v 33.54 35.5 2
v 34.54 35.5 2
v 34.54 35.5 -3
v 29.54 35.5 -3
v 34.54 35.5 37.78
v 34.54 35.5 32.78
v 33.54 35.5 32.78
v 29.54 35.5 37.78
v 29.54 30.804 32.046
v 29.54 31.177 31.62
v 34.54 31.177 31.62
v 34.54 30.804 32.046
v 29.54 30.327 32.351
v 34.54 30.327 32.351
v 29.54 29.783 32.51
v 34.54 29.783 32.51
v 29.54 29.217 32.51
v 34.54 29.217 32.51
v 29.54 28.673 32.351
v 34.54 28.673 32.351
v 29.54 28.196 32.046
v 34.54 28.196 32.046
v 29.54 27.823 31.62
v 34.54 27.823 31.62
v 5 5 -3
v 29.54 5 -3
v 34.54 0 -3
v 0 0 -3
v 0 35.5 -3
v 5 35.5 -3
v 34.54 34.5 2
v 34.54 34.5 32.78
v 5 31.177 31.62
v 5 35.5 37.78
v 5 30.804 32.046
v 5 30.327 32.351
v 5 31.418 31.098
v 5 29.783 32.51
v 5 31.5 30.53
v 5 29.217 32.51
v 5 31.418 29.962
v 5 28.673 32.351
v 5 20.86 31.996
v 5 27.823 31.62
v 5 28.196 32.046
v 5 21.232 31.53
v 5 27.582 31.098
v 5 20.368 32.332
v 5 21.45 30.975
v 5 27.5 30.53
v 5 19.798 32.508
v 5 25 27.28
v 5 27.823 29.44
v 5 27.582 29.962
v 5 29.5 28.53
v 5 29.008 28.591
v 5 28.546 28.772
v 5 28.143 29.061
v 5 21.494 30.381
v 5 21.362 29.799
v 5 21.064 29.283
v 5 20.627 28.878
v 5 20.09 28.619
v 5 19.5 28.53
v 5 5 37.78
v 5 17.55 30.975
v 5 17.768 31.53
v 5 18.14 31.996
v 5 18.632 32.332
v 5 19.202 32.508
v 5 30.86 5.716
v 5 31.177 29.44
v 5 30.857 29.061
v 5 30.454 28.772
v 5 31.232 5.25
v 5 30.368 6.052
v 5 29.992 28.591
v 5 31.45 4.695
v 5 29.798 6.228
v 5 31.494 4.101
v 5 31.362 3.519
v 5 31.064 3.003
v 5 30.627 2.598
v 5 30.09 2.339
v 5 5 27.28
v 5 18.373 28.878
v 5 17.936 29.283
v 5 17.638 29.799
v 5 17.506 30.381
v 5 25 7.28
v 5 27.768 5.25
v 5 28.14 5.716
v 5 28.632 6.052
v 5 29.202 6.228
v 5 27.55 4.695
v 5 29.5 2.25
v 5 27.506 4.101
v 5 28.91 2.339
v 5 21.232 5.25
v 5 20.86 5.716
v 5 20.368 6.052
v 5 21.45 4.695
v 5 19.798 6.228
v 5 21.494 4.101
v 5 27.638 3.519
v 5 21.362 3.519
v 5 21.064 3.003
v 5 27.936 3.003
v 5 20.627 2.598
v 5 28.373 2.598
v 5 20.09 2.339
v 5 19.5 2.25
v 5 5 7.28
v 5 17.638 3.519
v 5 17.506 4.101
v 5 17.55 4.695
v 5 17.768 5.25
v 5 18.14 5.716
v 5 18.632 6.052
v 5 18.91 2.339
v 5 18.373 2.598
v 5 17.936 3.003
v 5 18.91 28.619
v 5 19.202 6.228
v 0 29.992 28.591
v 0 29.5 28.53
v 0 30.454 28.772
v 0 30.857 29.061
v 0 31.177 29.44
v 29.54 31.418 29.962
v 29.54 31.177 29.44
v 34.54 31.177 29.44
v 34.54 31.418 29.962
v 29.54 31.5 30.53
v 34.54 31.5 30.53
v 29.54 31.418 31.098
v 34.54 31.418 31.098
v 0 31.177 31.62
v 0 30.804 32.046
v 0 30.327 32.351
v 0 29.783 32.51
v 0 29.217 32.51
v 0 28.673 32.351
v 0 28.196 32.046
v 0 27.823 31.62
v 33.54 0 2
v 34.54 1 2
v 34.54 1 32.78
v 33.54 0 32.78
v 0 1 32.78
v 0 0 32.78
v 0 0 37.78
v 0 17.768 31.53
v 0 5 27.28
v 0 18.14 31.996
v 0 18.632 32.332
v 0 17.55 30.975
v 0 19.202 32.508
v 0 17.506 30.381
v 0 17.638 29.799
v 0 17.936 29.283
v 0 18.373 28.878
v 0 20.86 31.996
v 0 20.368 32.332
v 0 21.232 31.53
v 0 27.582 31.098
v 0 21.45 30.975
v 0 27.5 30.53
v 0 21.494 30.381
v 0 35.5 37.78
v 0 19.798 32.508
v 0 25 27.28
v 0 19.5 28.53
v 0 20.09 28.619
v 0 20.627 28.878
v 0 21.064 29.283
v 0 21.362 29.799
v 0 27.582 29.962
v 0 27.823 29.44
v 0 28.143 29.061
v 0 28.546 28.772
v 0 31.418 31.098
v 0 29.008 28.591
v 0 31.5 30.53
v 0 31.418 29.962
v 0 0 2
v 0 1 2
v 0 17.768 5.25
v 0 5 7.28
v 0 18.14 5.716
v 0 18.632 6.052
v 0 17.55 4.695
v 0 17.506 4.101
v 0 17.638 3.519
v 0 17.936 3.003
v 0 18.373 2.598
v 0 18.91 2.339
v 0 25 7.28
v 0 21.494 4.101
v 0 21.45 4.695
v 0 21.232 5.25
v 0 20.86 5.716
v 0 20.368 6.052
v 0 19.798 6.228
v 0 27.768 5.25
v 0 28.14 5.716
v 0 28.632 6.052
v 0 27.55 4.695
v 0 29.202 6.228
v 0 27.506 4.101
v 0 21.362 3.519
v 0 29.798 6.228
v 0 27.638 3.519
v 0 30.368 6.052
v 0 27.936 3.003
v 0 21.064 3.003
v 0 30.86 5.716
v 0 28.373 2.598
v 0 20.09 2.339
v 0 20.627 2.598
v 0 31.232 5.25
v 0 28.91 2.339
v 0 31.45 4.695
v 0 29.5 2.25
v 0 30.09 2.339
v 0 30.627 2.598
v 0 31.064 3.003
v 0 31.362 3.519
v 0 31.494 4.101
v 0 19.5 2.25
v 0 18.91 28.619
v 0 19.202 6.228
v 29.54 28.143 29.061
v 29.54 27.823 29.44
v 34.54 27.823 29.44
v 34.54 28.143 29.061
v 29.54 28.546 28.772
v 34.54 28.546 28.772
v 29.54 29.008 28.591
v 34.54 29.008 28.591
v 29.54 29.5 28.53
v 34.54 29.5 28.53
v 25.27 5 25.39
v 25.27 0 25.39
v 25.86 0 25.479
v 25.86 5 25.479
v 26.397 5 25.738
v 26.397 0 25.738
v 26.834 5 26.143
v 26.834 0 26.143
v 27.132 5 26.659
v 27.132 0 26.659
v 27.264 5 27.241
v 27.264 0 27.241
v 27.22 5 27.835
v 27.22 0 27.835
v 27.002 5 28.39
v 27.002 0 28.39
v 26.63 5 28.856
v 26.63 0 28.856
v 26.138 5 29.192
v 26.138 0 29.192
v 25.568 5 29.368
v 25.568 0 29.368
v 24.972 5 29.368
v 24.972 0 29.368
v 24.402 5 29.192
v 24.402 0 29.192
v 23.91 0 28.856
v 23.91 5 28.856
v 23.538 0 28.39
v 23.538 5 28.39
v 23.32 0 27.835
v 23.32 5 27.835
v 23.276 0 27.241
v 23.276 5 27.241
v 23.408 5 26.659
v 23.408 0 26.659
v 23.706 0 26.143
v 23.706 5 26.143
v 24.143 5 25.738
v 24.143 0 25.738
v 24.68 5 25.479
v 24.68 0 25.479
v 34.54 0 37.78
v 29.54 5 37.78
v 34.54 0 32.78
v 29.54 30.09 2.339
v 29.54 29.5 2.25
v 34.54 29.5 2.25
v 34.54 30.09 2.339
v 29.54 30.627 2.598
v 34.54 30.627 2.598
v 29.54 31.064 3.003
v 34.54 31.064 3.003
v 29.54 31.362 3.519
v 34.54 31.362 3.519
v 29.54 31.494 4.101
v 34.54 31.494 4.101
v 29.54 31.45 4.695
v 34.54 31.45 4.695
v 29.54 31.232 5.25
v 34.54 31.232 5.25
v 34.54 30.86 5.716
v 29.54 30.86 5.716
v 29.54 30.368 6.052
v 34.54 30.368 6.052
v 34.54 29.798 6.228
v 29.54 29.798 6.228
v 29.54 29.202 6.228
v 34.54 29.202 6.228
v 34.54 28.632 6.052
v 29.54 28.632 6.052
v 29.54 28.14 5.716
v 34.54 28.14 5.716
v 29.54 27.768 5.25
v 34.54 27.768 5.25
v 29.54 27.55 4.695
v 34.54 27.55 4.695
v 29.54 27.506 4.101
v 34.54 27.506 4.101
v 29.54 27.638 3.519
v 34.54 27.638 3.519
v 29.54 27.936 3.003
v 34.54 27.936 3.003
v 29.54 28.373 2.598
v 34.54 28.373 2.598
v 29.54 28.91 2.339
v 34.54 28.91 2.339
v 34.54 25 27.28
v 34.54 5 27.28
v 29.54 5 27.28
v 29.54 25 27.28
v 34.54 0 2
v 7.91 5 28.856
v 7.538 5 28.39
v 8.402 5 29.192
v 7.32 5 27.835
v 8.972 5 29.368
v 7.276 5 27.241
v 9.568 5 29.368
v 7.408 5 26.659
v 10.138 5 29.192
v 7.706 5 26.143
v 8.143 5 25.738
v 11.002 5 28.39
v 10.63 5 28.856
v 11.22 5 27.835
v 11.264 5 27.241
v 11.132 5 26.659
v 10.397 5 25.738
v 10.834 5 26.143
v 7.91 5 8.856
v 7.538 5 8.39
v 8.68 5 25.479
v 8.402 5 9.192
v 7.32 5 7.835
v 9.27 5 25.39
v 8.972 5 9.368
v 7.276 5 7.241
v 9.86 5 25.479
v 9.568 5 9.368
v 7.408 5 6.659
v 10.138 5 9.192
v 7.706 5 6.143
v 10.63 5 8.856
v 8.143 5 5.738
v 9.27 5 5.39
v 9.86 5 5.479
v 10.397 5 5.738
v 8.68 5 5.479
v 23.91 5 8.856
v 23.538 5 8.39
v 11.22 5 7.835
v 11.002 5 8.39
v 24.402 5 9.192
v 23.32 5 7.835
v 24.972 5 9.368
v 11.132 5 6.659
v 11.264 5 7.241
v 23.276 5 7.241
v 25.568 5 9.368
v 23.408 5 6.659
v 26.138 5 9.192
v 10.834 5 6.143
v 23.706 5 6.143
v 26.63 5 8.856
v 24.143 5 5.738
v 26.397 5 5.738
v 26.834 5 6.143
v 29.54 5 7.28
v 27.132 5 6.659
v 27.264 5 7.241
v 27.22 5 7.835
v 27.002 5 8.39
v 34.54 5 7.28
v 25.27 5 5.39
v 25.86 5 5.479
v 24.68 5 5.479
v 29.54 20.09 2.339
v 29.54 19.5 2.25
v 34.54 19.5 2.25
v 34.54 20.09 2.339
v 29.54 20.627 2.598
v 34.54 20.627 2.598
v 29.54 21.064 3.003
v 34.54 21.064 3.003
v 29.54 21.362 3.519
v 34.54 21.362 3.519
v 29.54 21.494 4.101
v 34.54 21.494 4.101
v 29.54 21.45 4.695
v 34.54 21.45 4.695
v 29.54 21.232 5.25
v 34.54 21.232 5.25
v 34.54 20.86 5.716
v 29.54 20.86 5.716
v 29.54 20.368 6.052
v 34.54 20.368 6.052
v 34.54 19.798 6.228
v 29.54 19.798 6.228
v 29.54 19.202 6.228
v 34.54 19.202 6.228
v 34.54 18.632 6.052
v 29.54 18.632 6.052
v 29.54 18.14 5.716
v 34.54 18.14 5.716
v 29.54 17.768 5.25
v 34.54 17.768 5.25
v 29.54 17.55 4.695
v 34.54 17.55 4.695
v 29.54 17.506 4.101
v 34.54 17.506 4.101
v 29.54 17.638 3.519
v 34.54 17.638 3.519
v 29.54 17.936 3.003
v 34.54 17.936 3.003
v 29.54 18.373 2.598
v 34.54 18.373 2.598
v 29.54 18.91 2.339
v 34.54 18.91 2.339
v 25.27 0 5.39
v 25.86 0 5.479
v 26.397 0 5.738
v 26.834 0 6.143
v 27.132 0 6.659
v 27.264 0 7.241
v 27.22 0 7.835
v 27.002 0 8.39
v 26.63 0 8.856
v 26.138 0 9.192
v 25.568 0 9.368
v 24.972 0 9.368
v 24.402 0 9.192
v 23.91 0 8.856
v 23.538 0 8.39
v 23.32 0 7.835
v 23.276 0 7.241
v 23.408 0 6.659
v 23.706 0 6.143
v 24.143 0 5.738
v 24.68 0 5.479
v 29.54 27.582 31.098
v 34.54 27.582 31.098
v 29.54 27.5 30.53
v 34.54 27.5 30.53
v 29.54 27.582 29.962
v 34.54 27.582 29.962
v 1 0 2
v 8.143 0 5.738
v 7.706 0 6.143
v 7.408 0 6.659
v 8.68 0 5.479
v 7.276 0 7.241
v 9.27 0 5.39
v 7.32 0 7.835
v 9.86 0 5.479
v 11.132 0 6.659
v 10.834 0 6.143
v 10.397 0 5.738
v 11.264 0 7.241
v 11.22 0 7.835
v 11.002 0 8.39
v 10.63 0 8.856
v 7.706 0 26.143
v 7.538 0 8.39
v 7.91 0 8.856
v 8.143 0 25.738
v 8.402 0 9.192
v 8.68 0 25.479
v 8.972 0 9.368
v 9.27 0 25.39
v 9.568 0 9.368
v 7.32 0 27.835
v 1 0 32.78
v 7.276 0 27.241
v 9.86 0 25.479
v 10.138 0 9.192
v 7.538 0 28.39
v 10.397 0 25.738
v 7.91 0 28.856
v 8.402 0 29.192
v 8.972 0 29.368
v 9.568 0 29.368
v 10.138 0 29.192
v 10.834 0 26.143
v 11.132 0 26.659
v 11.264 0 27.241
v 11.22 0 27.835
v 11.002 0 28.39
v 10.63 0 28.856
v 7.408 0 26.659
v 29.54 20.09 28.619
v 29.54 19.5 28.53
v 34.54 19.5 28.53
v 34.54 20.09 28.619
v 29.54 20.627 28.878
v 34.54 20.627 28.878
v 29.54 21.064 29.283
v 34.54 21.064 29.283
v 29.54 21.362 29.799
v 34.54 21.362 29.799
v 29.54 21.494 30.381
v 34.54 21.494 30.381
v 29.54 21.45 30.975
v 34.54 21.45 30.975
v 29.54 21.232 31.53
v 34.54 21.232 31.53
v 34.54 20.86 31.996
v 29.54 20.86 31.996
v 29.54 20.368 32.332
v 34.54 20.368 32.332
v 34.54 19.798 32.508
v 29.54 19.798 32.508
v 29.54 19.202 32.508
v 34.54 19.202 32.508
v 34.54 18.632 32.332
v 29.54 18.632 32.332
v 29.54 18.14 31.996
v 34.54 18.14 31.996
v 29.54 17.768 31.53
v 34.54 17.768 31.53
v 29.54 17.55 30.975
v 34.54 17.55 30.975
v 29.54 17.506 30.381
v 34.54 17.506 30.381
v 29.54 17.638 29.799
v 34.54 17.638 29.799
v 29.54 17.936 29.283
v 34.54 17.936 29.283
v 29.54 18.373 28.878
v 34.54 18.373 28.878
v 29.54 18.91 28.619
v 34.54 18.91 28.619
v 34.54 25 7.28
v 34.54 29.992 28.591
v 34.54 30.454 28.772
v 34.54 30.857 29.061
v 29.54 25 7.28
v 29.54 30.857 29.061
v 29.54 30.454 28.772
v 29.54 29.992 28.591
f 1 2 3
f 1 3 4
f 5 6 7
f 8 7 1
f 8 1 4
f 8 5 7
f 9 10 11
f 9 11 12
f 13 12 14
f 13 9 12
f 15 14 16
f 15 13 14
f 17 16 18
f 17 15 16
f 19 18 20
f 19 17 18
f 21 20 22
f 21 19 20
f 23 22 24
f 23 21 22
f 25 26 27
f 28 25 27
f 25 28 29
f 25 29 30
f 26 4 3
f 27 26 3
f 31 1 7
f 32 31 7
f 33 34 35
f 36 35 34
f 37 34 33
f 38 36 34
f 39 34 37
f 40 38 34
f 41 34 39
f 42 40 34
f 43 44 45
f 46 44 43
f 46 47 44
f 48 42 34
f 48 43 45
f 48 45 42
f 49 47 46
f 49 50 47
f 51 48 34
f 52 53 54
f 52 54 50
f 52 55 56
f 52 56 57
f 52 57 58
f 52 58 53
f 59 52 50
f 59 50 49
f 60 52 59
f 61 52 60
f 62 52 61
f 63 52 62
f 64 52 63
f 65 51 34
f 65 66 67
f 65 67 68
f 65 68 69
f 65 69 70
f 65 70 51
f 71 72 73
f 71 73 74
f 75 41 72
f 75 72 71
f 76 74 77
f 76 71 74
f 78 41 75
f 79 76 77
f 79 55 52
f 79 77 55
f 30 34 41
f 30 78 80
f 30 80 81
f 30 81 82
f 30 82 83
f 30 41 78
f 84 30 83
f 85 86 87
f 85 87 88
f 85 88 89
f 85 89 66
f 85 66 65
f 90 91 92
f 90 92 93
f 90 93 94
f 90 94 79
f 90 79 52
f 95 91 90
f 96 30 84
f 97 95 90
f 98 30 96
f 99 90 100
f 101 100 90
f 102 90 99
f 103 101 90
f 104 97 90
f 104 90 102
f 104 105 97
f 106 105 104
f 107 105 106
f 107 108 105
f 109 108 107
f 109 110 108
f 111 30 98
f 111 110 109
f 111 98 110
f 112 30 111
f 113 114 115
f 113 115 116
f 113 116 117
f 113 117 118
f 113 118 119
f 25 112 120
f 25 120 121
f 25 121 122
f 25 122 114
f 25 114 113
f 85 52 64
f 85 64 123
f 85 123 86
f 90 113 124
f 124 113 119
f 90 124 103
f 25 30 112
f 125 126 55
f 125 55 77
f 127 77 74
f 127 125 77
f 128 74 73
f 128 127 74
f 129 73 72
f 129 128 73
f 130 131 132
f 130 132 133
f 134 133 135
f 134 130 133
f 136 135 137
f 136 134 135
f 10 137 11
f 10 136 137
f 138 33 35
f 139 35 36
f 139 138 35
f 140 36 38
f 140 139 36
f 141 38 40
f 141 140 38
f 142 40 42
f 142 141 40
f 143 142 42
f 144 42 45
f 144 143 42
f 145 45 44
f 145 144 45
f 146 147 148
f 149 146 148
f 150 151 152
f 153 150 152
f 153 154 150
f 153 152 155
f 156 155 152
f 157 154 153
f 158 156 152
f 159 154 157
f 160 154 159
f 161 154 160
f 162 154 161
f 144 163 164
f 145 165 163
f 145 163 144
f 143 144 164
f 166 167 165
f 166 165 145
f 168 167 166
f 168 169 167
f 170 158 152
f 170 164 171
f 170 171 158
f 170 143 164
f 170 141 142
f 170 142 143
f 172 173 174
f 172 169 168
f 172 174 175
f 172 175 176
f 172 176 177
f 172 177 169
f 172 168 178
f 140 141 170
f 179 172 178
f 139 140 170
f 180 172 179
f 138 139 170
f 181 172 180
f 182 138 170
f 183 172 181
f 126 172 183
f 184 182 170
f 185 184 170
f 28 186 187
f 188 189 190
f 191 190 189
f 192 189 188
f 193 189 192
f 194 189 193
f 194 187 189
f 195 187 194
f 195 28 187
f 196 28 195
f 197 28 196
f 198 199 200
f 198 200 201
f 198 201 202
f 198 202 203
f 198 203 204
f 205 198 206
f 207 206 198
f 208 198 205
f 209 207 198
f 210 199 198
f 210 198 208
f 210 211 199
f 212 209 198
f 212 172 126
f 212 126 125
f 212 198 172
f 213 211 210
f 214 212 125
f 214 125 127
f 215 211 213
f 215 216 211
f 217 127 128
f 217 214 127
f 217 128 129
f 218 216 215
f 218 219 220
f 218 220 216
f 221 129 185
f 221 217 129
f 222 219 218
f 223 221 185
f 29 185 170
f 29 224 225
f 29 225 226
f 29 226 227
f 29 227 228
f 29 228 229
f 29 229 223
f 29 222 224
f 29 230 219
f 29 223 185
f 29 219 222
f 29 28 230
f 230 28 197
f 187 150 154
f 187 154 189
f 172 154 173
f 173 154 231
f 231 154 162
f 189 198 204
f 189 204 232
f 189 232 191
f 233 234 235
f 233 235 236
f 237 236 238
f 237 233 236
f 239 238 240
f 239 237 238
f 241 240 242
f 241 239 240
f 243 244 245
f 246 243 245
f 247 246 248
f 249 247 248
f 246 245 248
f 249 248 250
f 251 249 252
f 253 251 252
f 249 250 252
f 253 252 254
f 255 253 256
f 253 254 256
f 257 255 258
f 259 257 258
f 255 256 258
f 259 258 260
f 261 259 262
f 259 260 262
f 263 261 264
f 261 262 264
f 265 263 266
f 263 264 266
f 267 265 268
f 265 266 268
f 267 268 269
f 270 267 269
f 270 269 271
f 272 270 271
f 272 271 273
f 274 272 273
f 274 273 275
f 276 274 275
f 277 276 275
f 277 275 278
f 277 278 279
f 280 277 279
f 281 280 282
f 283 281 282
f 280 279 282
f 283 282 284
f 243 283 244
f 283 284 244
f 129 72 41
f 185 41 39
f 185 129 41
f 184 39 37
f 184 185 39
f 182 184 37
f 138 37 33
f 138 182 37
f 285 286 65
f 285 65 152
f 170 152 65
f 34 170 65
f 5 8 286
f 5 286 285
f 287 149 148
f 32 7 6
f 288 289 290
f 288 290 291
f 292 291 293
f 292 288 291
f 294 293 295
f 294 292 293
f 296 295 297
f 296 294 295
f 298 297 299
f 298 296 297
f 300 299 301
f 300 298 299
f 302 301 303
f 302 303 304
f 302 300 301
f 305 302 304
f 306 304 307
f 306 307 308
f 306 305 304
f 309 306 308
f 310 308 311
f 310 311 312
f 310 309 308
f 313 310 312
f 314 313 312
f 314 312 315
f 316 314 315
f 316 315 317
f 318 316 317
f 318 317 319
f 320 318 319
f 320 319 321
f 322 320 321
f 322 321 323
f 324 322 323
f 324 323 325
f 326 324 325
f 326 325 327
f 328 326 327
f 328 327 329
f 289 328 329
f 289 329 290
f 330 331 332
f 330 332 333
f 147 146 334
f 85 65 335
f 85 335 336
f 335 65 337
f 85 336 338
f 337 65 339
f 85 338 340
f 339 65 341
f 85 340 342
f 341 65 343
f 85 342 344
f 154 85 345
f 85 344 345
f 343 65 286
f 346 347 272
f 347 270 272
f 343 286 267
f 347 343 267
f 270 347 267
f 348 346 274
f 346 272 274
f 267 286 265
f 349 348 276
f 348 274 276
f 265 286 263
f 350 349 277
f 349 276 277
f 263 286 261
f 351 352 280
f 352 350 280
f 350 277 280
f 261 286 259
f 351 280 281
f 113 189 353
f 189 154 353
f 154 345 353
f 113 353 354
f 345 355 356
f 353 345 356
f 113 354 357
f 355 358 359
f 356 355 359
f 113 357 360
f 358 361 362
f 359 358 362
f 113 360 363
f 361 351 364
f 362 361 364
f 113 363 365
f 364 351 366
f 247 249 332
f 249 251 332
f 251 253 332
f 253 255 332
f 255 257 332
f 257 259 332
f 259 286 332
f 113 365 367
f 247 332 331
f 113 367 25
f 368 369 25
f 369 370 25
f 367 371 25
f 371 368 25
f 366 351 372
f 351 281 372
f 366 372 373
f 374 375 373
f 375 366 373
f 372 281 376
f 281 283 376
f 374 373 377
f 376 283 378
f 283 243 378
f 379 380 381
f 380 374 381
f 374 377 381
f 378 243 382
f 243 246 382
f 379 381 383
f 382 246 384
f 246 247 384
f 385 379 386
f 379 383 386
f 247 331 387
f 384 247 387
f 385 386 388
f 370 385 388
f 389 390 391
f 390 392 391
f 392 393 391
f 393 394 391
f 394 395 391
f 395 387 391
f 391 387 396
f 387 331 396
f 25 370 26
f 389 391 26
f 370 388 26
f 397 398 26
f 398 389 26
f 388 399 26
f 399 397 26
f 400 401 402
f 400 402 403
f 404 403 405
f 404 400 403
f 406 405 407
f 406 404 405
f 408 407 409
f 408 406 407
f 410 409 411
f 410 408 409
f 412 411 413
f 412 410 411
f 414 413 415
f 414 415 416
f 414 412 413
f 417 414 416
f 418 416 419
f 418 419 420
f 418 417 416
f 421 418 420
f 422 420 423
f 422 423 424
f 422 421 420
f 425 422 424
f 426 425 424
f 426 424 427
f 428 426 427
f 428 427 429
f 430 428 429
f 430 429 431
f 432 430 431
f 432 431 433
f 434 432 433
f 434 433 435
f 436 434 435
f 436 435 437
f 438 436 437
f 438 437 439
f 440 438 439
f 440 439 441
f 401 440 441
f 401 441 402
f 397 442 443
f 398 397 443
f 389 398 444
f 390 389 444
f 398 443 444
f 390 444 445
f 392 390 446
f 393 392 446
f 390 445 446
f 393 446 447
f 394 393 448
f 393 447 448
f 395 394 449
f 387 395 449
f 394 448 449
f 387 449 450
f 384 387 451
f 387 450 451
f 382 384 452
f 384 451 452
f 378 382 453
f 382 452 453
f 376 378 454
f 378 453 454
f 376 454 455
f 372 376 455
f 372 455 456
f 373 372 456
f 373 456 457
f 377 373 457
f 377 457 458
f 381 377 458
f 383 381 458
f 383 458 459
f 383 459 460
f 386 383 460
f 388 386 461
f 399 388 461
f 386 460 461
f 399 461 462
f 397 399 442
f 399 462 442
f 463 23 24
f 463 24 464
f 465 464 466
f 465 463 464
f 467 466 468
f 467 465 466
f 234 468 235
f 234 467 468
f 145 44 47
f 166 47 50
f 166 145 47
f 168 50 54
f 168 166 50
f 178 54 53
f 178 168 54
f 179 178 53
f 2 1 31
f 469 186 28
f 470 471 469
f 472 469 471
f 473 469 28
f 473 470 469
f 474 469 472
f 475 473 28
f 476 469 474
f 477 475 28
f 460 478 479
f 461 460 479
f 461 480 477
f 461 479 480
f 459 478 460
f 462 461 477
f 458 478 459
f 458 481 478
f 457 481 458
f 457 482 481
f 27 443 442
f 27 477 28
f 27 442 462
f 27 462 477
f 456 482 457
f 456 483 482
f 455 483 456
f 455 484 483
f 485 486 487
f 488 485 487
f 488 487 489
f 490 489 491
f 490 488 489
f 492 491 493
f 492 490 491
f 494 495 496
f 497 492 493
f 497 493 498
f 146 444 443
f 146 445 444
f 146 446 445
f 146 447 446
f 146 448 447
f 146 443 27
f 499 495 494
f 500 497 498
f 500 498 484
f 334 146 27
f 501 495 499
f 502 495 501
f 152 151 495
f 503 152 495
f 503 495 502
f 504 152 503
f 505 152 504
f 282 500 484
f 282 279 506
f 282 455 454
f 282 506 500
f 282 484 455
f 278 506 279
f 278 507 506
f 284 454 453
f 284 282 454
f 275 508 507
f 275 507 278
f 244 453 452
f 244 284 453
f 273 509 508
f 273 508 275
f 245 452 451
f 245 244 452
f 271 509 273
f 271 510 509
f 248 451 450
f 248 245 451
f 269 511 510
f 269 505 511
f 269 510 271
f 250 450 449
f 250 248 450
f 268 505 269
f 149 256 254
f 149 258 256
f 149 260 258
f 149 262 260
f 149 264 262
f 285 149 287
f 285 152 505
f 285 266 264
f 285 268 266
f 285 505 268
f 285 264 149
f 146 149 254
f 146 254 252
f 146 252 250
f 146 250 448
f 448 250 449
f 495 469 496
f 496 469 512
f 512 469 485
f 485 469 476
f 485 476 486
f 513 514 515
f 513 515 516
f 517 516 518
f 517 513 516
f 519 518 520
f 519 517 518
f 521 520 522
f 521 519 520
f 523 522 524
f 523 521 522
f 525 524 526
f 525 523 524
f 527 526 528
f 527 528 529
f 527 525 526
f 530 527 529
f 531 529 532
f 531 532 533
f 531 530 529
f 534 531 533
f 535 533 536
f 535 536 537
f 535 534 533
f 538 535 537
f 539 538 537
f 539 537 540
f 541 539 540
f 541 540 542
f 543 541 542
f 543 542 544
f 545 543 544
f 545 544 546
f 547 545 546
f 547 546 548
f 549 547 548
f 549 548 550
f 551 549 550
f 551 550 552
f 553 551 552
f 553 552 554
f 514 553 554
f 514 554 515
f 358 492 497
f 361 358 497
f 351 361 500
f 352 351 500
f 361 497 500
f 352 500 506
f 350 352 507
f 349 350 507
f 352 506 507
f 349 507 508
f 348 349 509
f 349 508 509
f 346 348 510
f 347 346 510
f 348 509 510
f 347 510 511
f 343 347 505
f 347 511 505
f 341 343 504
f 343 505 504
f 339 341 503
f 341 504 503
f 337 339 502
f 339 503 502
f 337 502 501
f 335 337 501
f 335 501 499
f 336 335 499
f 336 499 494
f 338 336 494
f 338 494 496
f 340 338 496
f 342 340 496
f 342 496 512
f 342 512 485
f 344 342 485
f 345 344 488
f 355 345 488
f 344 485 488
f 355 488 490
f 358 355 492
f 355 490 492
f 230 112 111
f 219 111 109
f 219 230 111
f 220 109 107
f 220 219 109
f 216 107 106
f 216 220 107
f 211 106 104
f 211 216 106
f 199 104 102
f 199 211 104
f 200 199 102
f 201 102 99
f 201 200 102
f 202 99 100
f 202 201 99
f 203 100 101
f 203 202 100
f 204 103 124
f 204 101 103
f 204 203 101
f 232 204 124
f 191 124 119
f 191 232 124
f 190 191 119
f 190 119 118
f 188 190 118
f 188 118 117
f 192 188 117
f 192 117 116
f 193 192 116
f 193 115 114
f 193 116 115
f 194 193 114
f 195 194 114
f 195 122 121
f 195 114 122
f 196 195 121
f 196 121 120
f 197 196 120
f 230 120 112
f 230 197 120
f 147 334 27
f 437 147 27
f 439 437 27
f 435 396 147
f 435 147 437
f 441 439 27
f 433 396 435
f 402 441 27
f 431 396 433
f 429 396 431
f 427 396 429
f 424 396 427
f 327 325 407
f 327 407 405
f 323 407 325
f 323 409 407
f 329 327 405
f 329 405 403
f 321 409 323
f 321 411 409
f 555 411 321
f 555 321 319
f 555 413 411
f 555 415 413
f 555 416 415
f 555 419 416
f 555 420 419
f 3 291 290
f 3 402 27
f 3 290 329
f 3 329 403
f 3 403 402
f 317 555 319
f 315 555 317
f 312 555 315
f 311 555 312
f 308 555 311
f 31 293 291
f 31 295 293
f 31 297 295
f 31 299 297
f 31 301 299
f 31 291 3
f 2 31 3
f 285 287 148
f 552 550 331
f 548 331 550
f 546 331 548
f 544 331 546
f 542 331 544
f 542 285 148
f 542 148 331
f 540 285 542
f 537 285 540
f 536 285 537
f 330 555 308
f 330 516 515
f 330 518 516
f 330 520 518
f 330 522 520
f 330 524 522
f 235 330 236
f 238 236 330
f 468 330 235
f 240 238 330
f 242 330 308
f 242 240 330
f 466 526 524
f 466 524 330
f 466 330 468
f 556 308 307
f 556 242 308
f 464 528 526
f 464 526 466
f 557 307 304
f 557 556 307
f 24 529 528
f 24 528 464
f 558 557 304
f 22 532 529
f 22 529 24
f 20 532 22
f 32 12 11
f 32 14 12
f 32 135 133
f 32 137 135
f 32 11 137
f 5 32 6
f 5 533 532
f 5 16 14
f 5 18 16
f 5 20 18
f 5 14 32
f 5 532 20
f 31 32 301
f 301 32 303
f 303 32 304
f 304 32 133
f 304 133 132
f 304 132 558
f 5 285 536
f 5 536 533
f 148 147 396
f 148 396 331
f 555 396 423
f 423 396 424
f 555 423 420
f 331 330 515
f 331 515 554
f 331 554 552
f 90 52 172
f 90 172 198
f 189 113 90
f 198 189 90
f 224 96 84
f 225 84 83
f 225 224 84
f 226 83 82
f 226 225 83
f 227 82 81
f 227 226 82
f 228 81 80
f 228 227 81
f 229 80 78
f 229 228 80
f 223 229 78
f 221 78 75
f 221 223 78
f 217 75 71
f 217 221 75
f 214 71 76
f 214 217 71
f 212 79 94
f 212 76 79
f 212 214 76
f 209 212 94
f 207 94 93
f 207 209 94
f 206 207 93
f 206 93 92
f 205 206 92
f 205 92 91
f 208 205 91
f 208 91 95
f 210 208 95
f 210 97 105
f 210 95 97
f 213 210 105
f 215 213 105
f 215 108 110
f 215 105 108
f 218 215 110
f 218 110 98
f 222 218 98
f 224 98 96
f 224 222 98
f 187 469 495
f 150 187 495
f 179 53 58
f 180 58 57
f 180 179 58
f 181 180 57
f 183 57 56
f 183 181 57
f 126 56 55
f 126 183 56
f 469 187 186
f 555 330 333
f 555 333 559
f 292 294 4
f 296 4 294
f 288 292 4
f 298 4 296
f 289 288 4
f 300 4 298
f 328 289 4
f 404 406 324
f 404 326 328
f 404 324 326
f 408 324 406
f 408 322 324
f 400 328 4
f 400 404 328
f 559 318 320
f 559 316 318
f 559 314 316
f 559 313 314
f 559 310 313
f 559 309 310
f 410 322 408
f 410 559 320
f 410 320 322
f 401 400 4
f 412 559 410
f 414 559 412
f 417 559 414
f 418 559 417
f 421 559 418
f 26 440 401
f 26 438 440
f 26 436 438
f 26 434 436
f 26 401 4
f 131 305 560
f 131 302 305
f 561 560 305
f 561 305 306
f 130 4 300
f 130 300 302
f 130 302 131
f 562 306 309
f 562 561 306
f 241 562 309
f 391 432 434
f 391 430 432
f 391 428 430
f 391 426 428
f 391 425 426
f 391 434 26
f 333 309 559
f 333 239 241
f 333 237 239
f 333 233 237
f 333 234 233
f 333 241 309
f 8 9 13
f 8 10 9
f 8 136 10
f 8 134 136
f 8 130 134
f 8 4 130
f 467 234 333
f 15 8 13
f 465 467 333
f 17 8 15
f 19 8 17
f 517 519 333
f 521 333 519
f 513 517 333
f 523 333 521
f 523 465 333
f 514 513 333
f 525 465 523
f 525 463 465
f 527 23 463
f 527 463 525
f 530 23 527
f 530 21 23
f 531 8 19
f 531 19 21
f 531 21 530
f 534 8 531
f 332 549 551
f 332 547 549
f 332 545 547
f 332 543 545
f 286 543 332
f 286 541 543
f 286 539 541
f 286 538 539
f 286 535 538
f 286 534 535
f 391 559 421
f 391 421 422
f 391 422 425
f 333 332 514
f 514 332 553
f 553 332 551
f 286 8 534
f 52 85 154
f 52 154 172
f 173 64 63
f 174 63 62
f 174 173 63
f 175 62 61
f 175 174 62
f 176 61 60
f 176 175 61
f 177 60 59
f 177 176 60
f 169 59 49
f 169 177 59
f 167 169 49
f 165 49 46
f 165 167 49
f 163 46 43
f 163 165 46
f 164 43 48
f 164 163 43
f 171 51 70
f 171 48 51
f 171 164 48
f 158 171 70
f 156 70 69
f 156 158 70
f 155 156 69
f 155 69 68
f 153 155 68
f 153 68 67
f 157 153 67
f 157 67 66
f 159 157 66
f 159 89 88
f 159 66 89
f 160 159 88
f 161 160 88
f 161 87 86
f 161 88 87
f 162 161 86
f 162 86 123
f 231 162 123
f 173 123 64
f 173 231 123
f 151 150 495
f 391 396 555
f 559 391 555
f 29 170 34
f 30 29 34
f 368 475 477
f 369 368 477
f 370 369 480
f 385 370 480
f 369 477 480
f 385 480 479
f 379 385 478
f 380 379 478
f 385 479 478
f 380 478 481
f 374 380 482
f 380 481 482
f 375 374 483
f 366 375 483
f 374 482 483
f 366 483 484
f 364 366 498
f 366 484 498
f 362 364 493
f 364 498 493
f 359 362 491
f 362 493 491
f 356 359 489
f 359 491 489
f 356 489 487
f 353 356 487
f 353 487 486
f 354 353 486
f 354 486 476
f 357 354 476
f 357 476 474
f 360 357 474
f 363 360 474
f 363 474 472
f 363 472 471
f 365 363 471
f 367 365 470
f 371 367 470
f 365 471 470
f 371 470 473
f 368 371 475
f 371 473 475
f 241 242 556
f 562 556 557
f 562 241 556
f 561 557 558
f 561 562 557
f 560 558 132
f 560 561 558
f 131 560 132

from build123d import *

# Parameters (mm, degrees)
EXTRUDE_2_DEPTH     = 34.78
CUT_EXTRUDE_1_REACH = 62.522
SKETCH_2_W          = 20
SKETCH_2_H          = 20
CHAMFER_1_SIZE      = 1
CUT_EXTRUDE_START   = -34.54
SKETCH_3_R          = 2
CUT_EXTRUDE_2_DEPTH = 34.54
SKETCH_4_R          = 2
CUT_EXTRUDE_3_DEPTH = 5
EXTRUDE_START       = -2
EXTRUDE_3_DEPTH     = 5


with BuildPart() as part:
    # 草图1 → 凸台-拉伸2 (new body)
    with BuildSketch(Plane.XY):
        Polygon((0, 0), (0, 35.5), (5, 35.5), (5, 5), (29.54, 5), (29.54, 35.5), (34.54, 35.5), (34.54, 0), align=None)
    extrude(amount=EXTRUDE_2_DEPTH)

    # 切除-拉伸1: up to this face of the body (flat: up to its plane)
    cut_extrude_1_end = Plane(part.part.faces().sort_by_distance((0, 17.75, 17.39))[0])
    # 草图2 → 切除-拉伸1 (cut, up to the picked face)
    with BuildSketch(Plane(origin=(34.54, 0, 0), x_dir=(0, 0, -1), z_dir=(1, 0, 0)), mode=Mode.PRIVATE) as cut_extrude_1_sk1:
        with Locations((-17.28, 15)):
            Rectangle(SKETCH_2_W, SKETCH_2_H)
    cut_extrude_1_tool1 = split(extrude(cut_extrude_1_sk1.sketch, amount=-CUT_EXTRUDE_1_REACH, mode=Mode.PRIVATE), bisect_by=cut_extrude_1_end, keep=Keep.BOTH, mode=Mode.PRIVATE)
    add(cut_extrude_1_tool1.solids().sort_by(Axis((34.54, 15, 17.28), (-1, 0, 0)))[0], mode=Mode.SUBTRACT)

    # 倒角1
    chamfer_1_edges = [part.edges().sort_by_distance(p)[0] for p in [
        (34.54, 17.75, 0),
        (17.27, 0, 0),
        (0, 0, 17.39),
        (34.54, 35.5, 17.39),
        (34.54, 0, 17.39),
        (0, 17.75, 34.78),
        (17.27, 0, 34.78),
        (0, 17.75, 0),
        (34.54, 17.75, 34.78),
    ]]
    chamfer(chamfer_1_edges, length=CHAMFER_1_SIZE)

    # 草图3 → 切除-拉伸2 (cut)
    with BuildSketch(Plane(origin=(34.54, 0, 0), x_dir=(0, 0, -1), z_dir=(1, 0, 0)).offset(CUT_EXTRUDE_START)):
        with Locations((-30.53, 19.5)):
            Circle(SKETCH_3_R)
        with Locations((-4.25, 19.5)):
            Circle(SKETCH_3_R)
        with Locations((-4.25, 29.5)):
            Circle(SKETCH_3_R)
        with BuildLine():
            ThreePointArc((-31.619976701, 31.176887233), (-32.53, 29.5), (-31.619976701, 27.823112767))
            Line((-31.619976701, 27.823112767), (-30.53, 29.5))
            Line((-30.53, 29.5), (-31.619976701, 31.176887233))
        make_face()
        with BuildLine():
            Line((-30.53, 29.5), (-31.619976701, 27.823112767))
            ThreePointArc((-31.619976701, 27.823112767), (-30.53, 27.5), (-29.440023299, 27.823112767))
            Line((-29.440023299, 27.823112767), (-30.53, 29.5))
        make_face()
        with BuildLine():
            Line((-30.53, 29.5), (-29.440023299, 27.823112767))
            ThreePointArc((-29.440023299, 27.823112767), (-28.772167044, 28.546048587), (-28.53, 29.5))
            ThreePointArc((-28.53, 29.5), (-28.772167044, 30.453951413), (-29.440023299, 31.176887233))
            Line((-29.440023299, 31.176887233), (-30.53, 29.5))
        make_face()
        with BuildLine():
            ThreePointArc((-29.440023299, 31.176887233), (-30.53, 31.5), (-31.619976701, 31.176887233))
            Line((-31.619976701, 31.176887233), (-30.53, 29.5))
            Line((-30.53, 29.5), (-29.440023299, 31.176887233))
        make_face()
    extrude(amount=CUT_EXTRUDE_2_DEPTH, mode=Mode.SUBTRACT)

    # 草图4 → 切除-拉伸3 (cut)
    with BuildSketch(Plane.XZ):
        with Locations(Location((9.27, 27.39, 0), (0, 0, 270))):
            Circle(SKETCH_4_R)
        with Locations(Location((25.27, 27.39, 0), (0, 0, 270))):
            Circle(SKETCH_4_R)
        with Locations(Location((25.27, 7.39, 0), (0, 0, 270))):
            Circle(SKETCH_4_R)
        with Locations(Location((9.27, 7.39, 0), (0, 0, 270))):
            Circle(SKETCH_4_R)
    extrude(amount=-CUT_EXTRUDE_3_DEPTH, mode=Mode.SUBTRACT)

    # 草图8 → 凸台-拉伸3 (add)
    with BuildSketch(Plane.XY.offset(34.78).offset(EXTRUDE_START)):
        Polygon((1, 35.5), (1, 1), (33.54, 1), (33.54, 35.5), (29.54, 35.5), (29.54, 5), (5, 5), (5, 35.5), align=None)
        Polygon((34.54, 1), (34.54, 34.5), (34.54, 35.5), (33.54, 35.5), (33.54, 1), (1, 1), (1, 35.5), (0, 35.5), (0, 1), (0, 0), (1, 0), (33.54, 0), (34.54, 0), align=None)
    extrude_3 = extrude(amount=EXTRUDE_3_DEPTH)

    # 镜向1: 凸台-拉伸3 across plane
    add(extrude_3.mirror(Plane.XY.offset(17.39)))


solid = part.part
